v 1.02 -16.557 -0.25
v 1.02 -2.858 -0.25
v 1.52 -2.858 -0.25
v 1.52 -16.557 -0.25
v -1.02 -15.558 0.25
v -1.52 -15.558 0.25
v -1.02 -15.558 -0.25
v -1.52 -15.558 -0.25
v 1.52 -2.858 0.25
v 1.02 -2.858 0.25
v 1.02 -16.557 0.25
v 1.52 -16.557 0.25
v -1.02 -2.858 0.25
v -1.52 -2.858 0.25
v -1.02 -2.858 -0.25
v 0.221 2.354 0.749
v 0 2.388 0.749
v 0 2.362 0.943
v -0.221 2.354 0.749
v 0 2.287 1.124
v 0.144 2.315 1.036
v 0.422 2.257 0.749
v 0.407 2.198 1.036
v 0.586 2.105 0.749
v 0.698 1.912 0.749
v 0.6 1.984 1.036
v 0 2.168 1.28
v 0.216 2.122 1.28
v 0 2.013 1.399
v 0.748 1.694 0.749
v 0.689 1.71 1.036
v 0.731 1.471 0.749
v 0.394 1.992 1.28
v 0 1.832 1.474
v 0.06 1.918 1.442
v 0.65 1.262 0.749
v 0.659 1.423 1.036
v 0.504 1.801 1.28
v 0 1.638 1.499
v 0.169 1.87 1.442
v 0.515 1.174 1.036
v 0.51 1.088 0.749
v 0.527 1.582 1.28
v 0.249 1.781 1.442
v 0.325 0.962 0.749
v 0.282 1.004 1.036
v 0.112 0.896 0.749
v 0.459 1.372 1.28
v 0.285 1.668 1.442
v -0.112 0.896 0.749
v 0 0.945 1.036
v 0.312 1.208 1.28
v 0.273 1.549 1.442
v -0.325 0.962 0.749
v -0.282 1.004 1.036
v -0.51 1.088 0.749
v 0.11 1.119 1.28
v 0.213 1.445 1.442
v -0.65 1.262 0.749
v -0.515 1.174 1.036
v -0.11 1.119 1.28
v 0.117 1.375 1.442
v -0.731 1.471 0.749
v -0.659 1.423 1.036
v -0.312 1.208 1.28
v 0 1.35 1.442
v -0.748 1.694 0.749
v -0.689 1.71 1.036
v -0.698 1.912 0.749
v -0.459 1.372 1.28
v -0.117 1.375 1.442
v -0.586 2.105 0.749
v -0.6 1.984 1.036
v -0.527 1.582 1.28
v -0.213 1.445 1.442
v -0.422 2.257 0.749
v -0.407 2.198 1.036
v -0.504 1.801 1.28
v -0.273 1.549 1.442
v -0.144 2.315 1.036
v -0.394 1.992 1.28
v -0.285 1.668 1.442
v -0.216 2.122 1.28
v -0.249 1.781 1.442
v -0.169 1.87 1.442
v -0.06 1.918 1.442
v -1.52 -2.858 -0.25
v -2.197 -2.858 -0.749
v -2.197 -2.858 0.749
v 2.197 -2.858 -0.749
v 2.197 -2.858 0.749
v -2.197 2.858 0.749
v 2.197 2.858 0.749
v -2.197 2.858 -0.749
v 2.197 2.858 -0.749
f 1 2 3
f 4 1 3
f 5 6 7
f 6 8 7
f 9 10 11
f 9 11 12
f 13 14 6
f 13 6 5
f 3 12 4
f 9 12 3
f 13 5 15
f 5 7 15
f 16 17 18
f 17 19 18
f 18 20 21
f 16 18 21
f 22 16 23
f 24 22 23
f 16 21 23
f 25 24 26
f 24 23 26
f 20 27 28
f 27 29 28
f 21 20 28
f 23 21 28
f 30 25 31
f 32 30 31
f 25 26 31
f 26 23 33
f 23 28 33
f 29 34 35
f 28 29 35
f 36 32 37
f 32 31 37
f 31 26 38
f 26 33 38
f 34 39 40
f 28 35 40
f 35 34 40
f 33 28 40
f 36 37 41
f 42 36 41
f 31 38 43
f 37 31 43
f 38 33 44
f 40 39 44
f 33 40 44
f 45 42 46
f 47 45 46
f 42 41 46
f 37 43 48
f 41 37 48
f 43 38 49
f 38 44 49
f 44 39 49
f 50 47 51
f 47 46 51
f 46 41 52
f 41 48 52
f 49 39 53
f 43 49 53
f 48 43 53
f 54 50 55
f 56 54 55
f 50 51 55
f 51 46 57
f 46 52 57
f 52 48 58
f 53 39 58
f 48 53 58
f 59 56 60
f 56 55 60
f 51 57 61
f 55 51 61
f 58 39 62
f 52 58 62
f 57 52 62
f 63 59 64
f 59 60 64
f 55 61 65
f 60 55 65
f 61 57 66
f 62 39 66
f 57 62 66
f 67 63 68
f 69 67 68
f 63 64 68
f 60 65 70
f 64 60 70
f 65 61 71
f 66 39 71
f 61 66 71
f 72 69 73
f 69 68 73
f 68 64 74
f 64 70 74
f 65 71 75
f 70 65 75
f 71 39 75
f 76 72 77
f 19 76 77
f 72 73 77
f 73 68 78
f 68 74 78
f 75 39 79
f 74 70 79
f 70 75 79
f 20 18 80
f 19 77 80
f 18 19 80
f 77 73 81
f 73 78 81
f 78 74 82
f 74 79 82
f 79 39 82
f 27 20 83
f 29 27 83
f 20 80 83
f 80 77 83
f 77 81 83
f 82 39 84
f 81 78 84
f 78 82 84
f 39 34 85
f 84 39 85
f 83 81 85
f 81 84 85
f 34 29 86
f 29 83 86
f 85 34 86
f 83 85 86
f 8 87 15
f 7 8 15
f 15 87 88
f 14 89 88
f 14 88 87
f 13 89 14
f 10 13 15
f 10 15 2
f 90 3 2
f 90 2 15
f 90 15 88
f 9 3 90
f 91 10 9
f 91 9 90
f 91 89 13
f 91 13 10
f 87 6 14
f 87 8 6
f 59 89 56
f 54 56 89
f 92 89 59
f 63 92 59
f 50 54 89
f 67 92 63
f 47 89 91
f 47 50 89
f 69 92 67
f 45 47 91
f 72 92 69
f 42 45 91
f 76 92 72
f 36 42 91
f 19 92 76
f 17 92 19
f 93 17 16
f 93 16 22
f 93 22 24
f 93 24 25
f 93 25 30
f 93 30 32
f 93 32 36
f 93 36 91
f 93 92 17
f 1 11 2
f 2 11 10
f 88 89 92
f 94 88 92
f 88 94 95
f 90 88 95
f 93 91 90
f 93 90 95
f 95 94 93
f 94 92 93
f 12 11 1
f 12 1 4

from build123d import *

# Parameters (mm, degrees)
SKETCH1_W           = 4.3942
SKETCH1_H           = 5.715
BOSS_EXTRUDE1_DEPTH = 0.7493
SKETCH4_W           = 0.5
SKETCH4_H           = 12.7
SKETCH4_H_2         = 13.7
BOSS_EXTRUDE2_DEPTH = 0.25


with BuildPart() as part:
    # Sketch1 → Boss-Extrude1 (new body, symmetric)
    with BuildSketch(Plane.XY):
        Rectangle(SKETCH1_W, SKETCH1_H)
    extrude(amount=BOSS_EXTRUDE1_DEPTH, both=True)

    # Sketch3 → Revolve1 (revolve)
    with BuildSketch(Plane(origin=(0, 0, 0), x_dir=(0, 0, -1), z_dir=(1, 0, 0))):
        with BuildLine():
            Line((-1.4993, 1.6375), (-0.7493, 1.6375))
            Line((-0.7493, 1.6375), (-0.7493, 2.3875))
            ThreePointArc((-0.7493, 2.3875), (-1.279630086, 2.167830086), (-1.4993, 1.6375))
        make_face()
    revolve(axis=Axis((0, 1.6375, 2.078989668), (0, 0, -1)))

    # Sketch4 → Boss-Extrude2 (add, symmetric)
    with BuildSketch(Plane.XY):
        with Locations((-1.27, -9.2075)):
            Rectangle(SKETCH4_W, SKETCH4_H)
        with Locations((1.27, -9.7075)):
            Rectangle(SKETCH4_W, SKETCH4_H_2)
    extrude(amount=BOSS_EXTRUDE2_DEPTH, both=True)


solid = part.part
